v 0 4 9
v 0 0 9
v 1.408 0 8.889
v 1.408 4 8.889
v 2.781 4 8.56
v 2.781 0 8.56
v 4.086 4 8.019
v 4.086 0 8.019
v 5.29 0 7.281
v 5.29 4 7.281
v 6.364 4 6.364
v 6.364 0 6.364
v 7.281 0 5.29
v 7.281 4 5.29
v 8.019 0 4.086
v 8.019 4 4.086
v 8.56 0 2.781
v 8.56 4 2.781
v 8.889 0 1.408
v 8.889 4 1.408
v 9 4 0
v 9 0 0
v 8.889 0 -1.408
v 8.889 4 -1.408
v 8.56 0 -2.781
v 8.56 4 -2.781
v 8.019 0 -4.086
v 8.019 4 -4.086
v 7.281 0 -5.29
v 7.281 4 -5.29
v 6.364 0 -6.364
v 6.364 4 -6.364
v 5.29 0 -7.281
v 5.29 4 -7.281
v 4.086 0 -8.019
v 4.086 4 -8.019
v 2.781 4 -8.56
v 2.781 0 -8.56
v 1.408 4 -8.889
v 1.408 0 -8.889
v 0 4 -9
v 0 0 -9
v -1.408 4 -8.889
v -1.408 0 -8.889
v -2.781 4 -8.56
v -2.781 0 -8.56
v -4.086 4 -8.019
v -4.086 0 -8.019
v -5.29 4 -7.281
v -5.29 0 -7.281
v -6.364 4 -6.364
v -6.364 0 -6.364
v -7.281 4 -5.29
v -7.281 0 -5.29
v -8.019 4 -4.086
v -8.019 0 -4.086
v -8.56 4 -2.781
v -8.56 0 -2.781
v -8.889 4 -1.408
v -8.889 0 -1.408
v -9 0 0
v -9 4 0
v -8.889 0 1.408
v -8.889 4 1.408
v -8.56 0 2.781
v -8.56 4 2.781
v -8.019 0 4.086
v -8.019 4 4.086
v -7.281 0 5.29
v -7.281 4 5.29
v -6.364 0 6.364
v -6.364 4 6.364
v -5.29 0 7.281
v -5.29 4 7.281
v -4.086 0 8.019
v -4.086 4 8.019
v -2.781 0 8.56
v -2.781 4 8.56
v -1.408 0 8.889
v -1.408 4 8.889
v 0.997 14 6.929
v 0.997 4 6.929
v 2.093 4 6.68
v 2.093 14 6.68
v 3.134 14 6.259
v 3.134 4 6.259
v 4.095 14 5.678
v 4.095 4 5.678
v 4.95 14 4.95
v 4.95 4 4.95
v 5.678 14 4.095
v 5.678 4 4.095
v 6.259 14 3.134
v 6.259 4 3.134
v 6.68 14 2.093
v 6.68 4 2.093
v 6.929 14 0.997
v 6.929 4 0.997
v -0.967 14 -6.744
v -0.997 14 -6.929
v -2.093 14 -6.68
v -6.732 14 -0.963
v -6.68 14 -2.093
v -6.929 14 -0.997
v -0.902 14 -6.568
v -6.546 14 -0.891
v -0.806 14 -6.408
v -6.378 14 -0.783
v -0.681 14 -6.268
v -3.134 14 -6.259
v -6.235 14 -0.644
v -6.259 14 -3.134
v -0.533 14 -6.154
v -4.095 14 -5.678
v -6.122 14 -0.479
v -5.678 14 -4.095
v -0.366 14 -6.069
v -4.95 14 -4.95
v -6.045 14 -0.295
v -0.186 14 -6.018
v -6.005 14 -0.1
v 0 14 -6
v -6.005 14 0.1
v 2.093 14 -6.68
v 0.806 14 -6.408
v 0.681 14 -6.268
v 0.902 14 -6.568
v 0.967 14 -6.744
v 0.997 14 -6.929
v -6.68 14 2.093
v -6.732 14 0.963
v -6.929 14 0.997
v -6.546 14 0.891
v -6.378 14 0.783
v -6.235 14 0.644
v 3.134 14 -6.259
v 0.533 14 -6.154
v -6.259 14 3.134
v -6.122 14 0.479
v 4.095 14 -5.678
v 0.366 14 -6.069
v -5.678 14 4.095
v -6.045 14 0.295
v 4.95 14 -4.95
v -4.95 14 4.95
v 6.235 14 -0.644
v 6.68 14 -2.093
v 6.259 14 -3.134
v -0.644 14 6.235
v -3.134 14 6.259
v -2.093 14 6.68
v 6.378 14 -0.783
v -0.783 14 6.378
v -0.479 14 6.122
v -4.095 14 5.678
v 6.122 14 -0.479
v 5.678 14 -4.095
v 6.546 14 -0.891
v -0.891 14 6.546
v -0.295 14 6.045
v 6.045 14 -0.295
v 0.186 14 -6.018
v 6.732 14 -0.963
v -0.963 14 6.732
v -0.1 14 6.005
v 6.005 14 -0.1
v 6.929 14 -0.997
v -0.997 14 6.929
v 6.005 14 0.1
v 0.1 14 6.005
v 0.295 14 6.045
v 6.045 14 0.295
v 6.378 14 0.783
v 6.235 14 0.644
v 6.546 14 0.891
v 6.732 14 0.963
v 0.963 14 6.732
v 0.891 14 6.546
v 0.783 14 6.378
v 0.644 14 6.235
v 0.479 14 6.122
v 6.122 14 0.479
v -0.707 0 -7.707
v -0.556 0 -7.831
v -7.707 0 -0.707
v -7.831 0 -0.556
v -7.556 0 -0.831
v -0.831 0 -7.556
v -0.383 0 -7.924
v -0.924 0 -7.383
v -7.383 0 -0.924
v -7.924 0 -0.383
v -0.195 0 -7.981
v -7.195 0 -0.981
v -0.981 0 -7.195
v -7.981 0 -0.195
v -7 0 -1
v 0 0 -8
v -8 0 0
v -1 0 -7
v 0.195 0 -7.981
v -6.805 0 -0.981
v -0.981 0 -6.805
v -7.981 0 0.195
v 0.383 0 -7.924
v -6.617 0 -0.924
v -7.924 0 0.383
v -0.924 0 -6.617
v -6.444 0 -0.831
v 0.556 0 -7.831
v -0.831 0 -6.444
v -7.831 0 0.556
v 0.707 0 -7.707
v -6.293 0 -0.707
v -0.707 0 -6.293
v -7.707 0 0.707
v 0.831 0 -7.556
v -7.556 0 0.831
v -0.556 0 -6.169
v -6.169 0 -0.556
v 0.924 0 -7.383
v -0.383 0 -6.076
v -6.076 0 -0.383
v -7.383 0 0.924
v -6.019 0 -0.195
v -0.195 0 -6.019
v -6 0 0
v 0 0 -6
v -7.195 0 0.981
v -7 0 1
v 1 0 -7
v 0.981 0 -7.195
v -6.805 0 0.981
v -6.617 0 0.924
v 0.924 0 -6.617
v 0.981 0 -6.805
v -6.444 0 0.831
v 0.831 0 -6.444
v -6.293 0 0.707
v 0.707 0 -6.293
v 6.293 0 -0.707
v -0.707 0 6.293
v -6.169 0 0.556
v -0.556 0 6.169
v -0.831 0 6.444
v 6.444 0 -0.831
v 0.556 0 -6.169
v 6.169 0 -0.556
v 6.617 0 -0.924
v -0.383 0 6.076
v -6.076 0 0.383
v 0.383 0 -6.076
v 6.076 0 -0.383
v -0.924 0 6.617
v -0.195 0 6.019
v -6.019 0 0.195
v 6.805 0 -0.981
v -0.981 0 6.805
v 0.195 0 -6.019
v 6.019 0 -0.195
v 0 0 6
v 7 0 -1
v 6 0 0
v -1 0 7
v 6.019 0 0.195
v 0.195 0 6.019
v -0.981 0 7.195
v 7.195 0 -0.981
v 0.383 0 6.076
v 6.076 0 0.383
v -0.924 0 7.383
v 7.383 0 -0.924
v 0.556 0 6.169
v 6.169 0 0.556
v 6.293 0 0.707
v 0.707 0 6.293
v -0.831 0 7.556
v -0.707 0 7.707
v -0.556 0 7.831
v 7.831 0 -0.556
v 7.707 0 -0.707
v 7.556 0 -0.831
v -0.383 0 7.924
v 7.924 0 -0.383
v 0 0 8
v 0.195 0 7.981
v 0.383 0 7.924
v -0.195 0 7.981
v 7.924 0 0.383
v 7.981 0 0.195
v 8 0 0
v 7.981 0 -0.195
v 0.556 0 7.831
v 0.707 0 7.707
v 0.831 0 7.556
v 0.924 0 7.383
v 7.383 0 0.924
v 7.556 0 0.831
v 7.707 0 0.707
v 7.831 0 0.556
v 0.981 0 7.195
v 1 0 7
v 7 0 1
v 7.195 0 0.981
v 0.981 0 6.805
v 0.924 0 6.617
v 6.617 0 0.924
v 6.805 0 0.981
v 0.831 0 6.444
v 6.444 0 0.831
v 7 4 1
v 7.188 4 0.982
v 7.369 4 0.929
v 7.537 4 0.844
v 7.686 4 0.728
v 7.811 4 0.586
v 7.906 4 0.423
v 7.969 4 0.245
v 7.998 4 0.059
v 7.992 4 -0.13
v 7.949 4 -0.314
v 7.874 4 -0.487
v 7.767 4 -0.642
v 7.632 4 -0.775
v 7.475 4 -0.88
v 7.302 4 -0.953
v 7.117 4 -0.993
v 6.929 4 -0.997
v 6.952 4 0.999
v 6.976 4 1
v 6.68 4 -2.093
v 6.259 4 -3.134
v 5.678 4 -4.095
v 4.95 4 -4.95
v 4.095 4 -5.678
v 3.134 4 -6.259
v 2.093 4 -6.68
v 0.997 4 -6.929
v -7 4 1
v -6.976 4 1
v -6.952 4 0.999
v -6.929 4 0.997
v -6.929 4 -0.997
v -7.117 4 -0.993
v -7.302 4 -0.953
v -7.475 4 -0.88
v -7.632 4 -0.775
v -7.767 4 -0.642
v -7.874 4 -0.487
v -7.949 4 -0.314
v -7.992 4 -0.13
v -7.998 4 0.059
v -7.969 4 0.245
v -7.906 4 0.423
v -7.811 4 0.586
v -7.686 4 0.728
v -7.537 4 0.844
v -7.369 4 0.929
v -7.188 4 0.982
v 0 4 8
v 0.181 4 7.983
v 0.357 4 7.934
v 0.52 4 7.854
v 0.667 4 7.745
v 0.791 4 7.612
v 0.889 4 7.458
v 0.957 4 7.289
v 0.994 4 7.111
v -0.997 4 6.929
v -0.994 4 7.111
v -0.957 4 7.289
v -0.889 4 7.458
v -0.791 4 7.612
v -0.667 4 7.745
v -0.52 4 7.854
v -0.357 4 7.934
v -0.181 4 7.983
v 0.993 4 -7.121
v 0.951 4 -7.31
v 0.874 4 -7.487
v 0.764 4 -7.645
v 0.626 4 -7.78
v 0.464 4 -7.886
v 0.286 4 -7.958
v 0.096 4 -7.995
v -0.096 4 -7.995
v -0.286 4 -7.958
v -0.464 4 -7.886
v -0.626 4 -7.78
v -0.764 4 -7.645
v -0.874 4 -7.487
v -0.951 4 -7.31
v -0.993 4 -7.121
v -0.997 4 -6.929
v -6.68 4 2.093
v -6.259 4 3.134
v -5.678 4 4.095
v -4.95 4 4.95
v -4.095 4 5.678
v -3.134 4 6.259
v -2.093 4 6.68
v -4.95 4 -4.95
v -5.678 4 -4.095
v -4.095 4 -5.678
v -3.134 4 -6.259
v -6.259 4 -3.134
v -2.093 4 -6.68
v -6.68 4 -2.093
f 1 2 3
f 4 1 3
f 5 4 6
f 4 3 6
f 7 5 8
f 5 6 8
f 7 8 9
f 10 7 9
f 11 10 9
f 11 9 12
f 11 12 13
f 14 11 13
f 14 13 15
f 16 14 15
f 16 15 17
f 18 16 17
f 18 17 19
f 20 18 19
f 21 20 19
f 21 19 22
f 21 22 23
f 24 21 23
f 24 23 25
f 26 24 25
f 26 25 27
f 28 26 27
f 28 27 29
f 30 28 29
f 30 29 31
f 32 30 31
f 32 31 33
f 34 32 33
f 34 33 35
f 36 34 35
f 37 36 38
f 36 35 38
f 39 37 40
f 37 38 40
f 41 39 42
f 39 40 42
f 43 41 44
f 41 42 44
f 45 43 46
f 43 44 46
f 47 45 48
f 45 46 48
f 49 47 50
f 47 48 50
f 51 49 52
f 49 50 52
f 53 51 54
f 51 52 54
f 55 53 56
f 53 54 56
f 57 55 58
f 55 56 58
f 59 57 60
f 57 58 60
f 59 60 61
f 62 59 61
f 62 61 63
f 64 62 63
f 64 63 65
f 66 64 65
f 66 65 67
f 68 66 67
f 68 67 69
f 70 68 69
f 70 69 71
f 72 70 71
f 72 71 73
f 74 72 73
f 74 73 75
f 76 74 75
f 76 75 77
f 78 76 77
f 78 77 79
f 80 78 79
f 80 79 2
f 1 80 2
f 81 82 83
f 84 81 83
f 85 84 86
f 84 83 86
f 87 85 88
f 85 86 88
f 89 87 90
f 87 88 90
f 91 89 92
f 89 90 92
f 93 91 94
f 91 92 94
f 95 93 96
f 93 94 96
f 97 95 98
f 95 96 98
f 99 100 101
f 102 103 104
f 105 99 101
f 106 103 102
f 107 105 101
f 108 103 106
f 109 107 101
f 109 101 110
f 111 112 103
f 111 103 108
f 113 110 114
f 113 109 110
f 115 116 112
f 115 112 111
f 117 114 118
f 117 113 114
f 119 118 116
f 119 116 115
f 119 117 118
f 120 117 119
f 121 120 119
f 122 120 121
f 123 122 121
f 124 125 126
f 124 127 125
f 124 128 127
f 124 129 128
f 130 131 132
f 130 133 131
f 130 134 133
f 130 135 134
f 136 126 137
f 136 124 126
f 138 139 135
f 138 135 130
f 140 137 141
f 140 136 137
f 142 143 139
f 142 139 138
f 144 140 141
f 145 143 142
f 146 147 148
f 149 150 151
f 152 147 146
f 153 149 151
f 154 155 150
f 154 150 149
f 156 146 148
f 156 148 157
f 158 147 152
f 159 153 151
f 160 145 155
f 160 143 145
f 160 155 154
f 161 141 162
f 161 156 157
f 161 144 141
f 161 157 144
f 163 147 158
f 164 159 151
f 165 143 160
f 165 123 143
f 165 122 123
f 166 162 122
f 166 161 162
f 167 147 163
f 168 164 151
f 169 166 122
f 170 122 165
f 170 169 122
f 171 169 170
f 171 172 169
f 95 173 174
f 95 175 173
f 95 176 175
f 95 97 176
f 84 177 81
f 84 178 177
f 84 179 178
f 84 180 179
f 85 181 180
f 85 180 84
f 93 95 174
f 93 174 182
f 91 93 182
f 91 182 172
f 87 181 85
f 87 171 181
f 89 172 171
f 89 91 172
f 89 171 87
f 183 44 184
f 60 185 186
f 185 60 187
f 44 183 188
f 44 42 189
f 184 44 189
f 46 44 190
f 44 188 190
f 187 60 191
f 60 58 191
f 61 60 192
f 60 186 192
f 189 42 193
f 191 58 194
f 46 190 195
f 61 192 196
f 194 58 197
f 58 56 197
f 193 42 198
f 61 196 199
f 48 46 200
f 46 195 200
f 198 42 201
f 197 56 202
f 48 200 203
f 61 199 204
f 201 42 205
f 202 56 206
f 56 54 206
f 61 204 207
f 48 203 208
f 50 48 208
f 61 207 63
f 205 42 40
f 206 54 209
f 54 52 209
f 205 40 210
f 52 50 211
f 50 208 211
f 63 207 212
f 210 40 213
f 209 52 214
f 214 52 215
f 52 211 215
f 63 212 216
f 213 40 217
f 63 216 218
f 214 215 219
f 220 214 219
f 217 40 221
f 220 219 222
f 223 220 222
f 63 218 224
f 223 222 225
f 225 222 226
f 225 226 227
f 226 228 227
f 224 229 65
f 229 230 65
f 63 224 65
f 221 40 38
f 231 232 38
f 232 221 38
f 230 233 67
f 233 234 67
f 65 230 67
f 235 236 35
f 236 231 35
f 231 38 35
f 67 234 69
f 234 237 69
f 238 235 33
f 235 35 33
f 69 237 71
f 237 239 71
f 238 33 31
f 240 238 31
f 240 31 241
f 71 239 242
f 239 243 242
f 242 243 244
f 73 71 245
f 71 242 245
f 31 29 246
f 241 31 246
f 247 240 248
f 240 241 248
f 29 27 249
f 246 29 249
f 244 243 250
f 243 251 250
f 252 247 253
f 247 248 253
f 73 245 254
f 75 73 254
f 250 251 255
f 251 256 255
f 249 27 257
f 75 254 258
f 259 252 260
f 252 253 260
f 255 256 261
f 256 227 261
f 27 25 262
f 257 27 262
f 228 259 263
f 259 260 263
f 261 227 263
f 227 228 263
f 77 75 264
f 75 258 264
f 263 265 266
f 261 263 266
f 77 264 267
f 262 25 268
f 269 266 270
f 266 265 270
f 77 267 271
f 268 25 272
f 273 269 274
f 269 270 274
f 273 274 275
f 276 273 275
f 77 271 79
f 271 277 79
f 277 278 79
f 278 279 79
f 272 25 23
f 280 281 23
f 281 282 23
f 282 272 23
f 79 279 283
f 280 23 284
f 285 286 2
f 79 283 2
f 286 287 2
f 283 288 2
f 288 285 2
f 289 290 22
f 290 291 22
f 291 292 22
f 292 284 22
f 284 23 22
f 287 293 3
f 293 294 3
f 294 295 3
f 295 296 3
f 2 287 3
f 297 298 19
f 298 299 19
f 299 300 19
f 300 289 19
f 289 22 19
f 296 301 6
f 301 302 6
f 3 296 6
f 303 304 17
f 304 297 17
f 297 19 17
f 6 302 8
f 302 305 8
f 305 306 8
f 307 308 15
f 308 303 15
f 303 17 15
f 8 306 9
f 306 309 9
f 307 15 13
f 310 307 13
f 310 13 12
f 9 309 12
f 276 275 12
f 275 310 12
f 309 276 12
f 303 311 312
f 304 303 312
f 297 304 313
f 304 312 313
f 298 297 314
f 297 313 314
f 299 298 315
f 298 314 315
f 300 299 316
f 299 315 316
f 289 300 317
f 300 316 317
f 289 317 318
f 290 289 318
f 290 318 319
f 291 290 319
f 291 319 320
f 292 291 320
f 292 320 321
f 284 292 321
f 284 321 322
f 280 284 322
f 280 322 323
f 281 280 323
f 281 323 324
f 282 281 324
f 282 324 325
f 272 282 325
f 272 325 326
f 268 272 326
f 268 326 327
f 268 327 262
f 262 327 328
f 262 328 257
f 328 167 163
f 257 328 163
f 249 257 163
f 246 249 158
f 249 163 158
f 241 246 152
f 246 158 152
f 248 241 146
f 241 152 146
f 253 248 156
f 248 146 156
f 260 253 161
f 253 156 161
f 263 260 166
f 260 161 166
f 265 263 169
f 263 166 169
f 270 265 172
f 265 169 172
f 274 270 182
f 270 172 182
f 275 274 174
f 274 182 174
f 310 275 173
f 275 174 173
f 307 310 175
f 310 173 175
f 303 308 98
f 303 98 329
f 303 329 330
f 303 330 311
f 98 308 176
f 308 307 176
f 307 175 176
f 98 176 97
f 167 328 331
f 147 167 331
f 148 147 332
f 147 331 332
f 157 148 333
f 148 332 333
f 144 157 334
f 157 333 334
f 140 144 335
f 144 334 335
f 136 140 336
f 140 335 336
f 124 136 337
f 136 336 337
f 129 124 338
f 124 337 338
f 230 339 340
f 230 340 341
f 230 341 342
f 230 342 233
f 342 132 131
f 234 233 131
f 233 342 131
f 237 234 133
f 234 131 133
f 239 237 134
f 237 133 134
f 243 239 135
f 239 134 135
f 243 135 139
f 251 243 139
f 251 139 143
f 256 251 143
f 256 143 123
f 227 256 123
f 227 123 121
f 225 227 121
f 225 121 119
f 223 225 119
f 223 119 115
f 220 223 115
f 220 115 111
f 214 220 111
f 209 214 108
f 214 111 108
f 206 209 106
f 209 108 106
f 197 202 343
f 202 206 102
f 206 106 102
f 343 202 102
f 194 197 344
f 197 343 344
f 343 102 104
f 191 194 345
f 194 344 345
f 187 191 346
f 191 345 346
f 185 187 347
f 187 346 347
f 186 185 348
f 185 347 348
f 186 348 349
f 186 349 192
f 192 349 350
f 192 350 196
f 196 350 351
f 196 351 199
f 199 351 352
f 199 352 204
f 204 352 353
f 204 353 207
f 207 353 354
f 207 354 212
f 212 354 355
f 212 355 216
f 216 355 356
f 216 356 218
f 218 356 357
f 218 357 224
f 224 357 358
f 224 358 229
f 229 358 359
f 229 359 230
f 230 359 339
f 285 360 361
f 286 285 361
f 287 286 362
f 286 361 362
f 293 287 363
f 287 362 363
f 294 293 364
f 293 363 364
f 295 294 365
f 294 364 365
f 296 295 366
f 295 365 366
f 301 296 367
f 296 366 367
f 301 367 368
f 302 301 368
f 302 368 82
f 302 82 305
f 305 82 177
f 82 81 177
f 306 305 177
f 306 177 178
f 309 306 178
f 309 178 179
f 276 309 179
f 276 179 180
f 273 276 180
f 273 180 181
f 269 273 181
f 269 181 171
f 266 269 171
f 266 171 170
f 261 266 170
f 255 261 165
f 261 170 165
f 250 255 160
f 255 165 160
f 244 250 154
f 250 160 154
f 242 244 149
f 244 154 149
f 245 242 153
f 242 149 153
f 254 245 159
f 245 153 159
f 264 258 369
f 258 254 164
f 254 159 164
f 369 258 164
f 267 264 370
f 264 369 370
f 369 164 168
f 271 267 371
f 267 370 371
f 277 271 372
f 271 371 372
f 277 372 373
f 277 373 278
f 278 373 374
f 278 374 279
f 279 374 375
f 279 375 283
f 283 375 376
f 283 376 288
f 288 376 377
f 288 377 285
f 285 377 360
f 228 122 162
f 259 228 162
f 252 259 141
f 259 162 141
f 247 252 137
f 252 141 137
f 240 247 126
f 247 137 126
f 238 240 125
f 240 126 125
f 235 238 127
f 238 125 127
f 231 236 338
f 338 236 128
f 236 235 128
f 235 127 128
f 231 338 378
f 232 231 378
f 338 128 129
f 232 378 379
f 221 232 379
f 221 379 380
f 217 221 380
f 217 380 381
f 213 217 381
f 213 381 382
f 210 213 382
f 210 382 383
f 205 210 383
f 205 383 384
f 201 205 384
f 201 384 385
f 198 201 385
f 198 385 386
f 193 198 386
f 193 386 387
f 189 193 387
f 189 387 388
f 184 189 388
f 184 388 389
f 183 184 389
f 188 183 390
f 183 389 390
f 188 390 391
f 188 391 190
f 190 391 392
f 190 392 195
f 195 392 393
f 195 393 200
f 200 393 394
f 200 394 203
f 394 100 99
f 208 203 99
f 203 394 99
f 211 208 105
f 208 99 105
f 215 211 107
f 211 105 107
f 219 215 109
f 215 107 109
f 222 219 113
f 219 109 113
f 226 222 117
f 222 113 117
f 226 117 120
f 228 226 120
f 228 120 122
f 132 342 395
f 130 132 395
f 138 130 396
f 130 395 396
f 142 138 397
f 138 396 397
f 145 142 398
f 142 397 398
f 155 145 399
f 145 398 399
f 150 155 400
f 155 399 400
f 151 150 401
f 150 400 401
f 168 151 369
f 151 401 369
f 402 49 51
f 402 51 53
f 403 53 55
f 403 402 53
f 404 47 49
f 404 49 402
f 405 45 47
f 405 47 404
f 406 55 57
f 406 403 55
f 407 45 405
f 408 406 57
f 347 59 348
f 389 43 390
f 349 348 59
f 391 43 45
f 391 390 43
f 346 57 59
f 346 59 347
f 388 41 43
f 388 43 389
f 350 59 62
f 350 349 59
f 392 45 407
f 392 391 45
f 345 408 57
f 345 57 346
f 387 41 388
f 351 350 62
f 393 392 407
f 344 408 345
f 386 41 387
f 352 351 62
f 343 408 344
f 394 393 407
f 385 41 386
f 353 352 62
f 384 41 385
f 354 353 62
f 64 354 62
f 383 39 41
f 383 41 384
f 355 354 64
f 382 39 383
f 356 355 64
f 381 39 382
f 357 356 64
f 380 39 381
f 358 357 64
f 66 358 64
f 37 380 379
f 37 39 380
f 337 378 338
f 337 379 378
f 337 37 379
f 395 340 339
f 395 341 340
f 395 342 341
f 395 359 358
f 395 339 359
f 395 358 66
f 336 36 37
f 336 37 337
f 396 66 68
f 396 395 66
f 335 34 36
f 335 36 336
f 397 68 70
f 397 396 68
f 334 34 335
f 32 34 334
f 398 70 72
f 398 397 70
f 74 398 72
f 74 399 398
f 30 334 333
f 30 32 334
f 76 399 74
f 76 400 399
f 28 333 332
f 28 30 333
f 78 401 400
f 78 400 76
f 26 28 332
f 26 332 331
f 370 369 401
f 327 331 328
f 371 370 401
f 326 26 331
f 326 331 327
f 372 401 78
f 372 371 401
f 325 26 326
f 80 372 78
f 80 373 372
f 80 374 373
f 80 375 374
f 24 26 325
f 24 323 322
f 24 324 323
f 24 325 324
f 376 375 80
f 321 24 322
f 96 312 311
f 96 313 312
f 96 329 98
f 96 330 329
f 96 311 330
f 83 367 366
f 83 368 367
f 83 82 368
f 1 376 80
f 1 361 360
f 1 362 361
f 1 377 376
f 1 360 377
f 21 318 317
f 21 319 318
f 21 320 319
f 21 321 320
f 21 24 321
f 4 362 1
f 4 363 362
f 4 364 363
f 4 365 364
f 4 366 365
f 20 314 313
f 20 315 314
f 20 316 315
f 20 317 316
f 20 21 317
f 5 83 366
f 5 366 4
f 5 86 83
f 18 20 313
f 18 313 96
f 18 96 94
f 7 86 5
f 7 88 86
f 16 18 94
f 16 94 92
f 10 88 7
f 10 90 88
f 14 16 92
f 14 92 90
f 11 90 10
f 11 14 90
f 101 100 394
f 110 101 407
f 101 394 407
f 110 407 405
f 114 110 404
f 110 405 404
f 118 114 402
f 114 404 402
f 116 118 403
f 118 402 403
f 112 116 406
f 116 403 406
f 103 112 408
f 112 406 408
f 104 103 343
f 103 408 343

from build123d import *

# Parameters (mm, degrees)
SKETCH_1_R          = 9
EXTRUDE_1_DEPTH     = 14
SKETCH_2_R          = 1
CUT_EXTRUDE_1_DEPTH = 20
CUT_EXTRUDE_START   = -10
SKETCH_3_R          = 9
SKETCH_3_R_2        = 7
CUT_EXTRUDE_2_DEPTH = 10


with BuildPart() as part:
    # Эскиз1 → Бобышка-Вытянуть1 (new body)
    with BuildSketch(Plane(origin=(0, 0, 0), x_dir=(1, 0, 0), z_dir=(0, 1, 0))):
        with Locations(Location((0, 0, 0), (0, 0, 270))):
            Circle(SKETCH_1_R)
    extrude(amount=EXTRUDE_1_DEPTH)

    # Эскиз2 → Вырез-Вытянуть1 (cut)
    with BuildSketch(Plane(origin=(0, 14, 0), x_dir=(1, 0, 0), z_dir=(0, 1, 0))):
        with Locations(Location((0, 7, 0), (0, 0, 270))):
            Circle(SKETCH_2_R)
        with Locations(Location((7, 0, 0), (0, 0, 270))):
            Circle(SKETCH_2_R)
        with Locations(Location((-7, 0, 0), (0, 0, 270))):
            Circle(SKETCH_2_R)
        with Locations(Location((0, -7, 0), (0, 0, 270))):
            Circle(SKETCH_2_R)
    extrude(amount=-CUT_EXTRUDE_1_DEPTH, mode=Mode.SUBTRACT)

    # Эскиз3 → Вырез-Вытянуть2 (cut)
    with BuildSketch(Plane(origin=(0, 14, 0), x_dir=(1, 0, 0), z_dir=(0, 1, 0)).offset(CUT_EXTRUDE_START)):
        with Locations(Location((0, 0, 0), (0, 0, 270))):
            Circle(SKETCH_3_R)
        Circle(SKETCH_3_R_2, mode=Mode.SUBTRACT)
    extrude(amount=CUT_EXTRUDE_2_DEPTH, mode=Mode.SUBTRACT)


solid = part.part
